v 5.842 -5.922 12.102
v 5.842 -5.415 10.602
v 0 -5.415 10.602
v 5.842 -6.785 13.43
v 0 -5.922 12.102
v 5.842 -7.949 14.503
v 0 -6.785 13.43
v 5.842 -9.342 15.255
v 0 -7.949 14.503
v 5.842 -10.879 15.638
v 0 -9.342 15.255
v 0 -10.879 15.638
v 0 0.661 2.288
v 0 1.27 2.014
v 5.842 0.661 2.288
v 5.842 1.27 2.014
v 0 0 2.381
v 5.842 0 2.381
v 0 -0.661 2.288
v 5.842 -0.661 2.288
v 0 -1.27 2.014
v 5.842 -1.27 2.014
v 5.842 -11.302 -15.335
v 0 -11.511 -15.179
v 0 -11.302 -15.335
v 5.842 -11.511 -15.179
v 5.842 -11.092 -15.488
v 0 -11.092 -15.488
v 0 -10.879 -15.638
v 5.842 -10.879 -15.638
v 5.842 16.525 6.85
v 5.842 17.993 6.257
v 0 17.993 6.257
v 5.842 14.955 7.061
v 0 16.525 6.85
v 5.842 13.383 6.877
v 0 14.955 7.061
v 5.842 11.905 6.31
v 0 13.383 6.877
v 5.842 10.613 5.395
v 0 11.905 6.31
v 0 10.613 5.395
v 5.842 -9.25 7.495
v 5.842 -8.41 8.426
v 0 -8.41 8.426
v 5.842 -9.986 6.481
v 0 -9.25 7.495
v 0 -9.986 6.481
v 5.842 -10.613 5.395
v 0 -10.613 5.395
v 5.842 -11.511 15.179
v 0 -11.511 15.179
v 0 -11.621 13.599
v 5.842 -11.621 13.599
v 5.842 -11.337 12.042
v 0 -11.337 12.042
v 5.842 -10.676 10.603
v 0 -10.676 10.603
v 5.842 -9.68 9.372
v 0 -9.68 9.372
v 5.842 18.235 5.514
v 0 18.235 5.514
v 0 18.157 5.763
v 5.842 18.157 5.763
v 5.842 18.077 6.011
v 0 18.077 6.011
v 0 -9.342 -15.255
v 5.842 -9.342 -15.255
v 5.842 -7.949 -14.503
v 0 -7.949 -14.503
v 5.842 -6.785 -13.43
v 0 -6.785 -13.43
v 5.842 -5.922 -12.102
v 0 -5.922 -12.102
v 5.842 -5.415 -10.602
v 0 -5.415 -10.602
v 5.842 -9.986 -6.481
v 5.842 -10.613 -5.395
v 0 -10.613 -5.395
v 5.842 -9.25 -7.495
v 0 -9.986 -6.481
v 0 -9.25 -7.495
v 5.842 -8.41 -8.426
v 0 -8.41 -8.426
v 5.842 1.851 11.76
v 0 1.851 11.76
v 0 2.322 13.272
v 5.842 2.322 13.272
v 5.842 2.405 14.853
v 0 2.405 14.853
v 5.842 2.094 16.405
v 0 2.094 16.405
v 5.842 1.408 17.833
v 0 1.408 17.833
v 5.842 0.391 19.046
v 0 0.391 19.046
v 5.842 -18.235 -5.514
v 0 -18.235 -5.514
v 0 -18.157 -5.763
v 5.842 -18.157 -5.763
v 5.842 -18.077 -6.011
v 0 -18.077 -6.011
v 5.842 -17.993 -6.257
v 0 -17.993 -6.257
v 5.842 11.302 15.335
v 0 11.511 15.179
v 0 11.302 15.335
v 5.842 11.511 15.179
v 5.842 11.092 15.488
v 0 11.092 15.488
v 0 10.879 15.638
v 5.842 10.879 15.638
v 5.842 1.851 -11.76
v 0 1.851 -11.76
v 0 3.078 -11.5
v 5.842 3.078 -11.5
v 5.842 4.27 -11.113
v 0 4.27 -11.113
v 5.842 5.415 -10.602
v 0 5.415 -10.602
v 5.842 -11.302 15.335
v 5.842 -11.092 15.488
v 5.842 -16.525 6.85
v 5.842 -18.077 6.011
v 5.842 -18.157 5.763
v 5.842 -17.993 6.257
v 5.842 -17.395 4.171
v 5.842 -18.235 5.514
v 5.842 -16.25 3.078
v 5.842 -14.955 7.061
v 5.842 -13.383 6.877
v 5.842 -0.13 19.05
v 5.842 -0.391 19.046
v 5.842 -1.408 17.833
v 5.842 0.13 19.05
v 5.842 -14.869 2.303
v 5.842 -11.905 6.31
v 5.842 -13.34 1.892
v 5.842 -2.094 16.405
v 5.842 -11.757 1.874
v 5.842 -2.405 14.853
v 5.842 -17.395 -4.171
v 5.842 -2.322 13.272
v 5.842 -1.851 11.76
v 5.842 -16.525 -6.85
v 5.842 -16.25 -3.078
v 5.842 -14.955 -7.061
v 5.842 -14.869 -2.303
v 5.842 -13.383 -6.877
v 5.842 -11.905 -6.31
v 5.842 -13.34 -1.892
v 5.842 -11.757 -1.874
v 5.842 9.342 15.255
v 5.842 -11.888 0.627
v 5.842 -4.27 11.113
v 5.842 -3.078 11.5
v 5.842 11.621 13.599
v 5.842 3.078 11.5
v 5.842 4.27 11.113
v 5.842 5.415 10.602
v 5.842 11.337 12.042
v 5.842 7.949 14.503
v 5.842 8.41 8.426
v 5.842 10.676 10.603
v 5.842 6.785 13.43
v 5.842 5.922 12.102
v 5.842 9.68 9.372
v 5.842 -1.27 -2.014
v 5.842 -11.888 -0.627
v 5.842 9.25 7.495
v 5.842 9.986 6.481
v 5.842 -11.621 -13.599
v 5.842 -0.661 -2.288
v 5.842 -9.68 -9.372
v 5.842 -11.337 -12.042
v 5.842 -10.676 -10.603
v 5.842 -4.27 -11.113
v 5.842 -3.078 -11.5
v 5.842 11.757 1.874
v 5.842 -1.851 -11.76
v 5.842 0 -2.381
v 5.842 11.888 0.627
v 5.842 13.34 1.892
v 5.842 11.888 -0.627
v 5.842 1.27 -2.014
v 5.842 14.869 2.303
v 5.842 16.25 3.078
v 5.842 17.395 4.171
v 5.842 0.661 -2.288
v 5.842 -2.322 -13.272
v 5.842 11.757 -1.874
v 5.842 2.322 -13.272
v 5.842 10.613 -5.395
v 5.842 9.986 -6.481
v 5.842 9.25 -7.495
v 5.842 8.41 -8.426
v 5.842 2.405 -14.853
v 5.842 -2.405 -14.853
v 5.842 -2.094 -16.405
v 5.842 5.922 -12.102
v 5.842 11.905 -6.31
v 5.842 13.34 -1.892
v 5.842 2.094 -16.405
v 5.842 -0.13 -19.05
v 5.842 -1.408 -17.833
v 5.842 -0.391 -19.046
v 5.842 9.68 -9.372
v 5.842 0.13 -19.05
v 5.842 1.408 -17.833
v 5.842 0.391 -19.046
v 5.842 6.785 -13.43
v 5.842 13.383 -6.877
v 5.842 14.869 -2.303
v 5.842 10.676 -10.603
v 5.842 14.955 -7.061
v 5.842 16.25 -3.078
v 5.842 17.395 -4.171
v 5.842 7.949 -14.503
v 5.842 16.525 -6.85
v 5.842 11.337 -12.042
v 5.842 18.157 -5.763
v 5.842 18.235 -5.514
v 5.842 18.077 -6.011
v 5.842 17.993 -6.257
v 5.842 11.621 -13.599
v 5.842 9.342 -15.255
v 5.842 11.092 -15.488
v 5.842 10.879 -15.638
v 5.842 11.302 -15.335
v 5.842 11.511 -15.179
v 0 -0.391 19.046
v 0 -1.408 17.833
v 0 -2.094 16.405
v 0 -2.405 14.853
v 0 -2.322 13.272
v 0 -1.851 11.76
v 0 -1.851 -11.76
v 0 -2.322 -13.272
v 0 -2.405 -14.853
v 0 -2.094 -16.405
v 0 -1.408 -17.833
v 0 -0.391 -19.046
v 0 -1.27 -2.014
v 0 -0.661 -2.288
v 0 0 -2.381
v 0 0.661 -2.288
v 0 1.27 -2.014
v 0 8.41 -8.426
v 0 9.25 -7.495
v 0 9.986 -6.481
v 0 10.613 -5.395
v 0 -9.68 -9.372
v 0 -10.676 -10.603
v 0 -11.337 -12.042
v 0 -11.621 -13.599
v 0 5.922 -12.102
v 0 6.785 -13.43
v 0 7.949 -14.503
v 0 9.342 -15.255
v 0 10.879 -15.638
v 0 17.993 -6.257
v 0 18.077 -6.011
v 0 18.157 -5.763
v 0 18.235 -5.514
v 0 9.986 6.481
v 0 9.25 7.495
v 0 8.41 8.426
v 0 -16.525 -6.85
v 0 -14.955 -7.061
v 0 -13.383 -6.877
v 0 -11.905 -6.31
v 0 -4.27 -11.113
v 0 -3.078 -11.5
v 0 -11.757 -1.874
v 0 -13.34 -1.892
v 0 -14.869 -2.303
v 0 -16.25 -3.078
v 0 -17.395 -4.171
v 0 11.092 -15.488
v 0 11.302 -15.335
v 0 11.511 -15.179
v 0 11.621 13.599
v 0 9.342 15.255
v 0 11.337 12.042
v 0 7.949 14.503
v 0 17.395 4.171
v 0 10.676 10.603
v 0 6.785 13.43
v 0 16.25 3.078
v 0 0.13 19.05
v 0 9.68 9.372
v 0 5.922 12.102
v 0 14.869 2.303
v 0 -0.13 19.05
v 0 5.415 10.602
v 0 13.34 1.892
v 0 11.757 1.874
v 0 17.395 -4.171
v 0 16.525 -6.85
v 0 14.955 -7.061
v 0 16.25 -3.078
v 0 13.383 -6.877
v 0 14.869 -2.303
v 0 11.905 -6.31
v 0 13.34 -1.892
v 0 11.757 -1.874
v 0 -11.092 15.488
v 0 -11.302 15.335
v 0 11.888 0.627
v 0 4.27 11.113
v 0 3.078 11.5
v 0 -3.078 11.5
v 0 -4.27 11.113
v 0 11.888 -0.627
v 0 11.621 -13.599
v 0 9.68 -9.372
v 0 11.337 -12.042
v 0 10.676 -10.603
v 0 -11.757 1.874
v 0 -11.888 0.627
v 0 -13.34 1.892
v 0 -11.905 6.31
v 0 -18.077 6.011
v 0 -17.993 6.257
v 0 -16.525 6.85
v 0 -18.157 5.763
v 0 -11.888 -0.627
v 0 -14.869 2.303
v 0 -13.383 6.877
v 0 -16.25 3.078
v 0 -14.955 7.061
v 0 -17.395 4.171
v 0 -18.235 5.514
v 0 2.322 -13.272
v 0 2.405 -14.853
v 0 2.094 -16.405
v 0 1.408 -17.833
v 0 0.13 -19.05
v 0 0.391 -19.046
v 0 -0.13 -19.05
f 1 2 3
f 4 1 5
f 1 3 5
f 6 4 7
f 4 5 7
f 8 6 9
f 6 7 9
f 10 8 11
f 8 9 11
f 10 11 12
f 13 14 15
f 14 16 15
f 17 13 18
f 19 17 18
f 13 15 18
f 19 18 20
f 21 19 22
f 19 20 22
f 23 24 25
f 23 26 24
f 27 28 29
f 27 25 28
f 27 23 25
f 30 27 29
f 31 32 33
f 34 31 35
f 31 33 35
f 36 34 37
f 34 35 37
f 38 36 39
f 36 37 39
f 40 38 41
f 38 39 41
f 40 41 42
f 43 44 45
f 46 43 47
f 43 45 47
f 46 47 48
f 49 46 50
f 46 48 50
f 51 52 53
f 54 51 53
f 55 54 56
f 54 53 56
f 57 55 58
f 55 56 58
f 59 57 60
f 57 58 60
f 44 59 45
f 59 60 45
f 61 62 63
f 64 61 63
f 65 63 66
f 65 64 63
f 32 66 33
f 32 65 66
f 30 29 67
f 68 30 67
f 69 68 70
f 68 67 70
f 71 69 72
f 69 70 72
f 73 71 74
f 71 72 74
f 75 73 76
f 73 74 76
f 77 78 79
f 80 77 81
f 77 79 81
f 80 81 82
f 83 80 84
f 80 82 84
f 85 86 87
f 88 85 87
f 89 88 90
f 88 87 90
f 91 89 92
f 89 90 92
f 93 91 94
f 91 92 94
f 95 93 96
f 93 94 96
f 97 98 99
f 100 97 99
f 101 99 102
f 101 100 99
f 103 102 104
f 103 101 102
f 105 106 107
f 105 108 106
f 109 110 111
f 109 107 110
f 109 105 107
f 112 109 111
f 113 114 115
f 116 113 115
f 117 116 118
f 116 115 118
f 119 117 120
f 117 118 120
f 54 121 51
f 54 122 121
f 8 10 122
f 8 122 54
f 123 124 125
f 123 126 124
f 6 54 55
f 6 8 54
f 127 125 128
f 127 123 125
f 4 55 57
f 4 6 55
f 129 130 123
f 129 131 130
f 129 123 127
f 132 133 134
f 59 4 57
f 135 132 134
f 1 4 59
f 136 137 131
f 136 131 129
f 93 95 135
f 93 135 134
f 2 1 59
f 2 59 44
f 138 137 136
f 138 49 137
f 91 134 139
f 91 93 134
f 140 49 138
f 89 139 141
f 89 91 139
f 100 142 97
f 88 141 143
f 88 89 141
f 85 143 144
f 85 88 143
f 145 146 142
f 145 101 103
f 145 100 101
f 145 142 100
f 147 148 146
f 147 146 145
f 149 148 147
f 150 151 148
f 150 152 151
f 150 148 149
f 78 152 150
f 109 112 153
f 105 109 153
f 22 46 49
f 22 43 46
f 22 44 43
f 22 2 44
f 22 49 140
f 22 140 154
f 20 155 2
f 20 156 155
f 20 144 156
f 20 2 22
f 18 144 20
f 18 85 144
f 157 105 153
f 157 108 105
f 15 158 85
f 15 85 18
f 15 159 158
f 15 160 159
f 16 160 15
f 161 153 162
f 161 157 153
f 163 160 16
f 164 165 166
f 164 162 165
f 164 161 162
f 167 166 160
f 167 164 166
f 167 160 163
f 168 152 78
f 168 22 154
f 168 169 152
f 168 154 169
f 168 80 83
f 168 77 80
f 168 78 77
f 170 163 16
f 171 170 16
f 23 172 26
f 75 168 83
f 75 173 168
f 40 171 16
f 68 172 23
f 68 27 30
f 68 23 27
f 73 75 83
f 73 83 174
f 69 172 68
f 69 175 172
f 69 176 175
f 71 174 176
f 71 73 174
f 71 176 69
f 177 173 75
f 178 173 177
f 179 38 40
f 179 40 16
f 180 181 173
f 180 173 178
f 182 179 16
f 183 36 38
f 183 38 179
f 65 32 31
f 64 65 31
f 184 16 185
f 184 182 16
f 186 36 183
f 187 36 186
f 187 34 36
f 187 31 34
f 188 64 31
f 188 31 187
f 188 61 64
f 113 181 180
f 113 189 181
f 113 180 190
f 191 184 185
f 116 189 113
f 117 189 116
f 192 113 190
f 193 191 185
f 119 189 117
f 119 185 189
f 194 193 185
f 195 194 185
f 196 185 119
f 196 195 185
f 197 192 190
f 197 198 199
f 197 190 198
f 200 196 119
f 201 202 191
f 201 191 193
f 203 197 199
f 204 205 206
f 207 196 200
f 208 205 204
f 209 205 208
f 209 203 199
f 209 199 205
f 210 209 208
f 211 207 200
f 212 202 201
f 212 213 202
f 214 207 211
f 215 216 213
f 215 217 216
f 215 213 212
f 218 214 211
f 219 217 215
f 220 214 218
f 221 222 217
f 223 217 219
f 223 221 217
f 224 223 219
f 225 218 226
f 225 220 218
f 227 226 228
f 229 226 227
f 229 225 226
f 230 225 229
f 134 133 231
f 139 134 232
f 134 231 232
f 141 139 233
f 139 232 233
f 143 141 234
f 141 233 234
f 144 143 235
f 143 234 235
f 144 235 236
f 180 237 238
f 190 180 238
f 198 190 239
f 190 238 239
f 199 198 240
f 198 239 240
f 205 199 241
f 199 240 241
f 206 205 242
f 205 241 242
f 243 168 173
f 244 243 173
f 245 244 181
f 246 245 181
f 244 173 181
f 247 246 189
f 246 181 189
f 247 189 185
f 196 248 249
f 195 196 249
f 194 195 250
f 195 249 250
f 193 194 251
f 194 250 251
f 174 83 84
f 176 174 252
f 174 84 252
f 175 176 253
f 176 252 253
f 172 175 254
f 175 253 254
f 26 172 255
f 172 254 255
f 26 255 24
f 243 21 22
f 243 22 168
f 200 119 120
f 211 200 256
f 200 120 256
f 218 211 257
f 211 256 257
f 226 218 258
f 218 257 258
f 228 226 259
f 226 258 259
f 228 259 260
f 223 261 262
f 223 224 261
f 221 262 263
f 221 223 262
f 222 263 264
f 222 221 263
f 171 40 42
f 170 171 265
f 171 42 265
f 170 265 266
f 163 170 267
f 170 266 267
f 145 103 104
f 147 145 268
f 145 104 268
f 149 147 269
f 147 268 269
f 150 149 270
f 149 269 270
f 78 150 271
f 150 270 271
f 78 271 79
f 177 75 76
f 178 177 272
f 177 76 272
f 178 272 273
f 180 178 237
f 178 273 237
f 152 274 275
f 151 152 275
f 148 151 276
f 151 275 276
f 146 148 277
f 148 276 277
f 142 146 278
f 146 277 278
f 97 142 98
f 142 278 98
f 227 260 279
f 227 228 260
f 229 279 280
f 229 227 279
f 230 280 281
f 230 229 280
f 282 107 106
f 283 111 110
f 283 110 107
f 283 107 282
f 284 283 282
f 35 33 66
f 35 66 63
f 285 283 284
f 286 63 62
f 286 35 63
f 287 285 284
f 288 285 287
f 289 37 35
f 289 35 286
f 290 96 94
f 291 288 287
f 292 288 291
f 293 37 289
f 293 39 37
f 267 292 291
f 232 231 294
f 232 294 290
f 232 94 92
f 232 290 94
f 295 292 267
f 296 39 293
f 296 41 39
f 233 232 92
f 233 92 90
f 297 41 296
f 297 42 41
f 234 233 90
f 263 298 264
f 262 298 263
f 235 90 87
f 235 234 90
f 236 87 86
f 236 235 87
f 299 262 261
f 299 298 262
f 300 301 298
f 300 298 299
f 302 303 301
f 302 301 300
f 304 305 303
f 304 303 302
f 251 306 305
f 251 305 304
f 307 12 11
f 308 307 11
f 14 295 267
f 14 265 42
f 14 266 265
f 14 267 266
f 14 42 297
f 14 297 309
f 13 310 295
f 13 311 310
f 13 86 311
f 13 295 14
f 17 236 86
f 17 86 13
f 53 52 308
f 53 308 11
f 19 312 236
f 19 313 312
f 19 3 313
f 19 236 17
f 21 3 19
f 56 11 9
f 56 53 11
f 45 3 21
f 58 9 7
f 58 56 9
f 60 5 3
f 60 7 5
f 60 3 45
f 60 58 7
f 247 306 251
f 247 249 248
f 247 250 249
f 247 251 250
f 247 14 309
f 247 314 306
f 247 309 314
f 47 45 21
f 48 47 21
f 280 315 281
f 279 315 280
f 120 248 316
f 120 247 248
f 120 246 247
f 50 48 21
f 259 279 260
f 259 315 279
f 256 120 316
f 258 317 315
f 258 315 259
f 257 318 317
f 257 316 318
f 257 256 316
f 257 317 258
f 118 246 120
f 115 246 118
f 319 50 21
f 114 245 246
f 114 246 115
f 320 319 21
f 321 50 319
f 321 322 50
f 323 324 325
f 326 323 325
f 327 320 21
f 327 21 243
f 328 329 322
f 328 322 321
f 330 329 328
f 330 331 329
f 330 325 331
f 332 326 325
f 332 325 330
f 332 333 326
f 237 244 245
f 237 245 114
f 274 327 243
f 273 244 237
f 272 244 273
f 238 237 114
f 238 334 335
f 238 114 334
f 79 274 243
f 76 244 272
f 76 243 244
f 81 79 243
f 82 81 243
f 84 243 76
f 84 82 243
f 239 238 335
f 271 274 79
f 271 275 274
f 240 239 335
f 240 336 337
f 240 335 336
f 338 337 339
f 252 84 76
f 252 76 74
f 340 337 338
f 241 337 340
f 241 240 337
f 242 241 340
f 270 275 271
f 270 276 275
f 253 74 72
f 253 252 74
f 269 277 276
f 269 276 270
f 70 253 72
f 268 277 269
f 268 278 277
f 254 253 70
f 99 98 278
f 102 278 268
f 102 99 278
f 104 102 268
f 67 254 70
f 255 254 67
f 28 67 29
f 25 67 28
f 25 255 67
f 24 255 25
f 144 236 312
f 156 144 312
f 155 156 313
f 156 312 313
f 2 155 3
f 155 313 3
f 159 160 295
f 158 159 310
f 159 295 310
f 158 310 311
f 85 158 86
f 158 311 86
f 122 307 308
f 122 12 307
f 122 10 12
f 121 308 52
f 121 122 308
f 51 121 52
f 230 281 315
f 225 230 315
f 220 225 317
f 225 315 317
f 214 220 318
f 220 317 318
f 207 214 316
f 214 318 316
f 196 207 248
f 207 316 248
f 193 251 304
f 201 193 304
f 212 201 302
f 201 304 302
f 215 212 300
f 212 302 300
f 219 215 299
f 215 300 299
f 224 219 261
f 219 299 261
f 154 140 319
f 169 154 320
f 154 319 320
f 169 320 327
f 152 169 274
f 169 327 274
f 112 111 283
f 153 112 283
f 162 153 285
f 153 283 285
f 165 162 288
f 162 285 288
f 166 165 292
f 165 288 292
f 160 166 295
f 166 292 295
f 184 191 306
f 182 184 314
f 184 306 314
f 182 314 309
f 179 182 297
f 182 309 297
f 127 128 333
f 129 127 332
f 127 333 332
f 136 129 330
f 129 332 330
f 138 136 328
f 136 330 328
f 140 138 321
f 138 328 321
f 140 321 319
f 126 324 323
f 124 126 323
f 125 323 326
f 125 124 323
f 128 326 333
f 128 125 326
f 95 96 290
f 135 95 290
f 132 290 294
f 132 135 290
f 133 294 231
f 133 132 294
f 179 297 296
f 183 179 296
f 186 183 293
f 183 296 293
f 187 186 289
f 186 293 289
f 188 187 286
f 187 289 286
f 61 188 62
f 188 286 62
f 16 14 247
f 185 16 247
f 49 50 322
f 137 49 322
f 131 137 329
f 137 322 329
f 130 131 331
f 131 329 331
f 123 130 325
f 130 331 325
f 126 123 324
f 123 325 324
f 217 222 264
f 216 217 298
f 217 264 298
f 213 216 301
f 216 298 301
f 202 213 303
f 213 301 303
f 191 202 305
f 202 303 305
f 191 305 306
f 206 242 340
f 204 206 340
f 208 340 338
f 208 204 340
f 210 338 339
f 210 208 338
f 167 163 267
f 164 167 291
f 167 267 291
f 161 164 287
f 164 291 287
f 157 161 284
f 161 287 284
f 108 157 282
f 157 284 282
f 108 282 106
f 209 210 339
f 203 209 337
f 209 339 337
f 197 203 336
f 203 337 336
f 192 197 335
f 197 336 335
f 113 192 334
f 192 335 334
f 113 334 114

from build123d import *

# Parameters (mm, degrees)
BASPROSKE_W         = 5.842
BASPROSKE_H         = 19.05
TOOTHCUT_DEPTH      = 28.566899789
TEETHCUTS_COUNT     = 10
TEETHCUTS_ANGLE     = 324
BORSKE_R            = 2.38125
BORE_DEPTH          = 50.8000508
BOSS_EXTRUDE1_DEPTH = 5.842
BOSS_EXTRUDE2_DEPTH = 5.842


with BuildPart() as part:
    # BasProSke → Base-Revolve (revolve)
    with BuildSketch(Plane(origin=(0, 0, 0), x_dir=(1, 0, 0), z_dir=(0, 1, 0)), mode=Mode.PRIVATE) as base_revolve_sk:
        with Locations((2.921, 9.525)):
            Rectangle(BASPROSKE_W, BASPROSKE_H)
    revolve(base_revolve_sk.sketch.rotate(Axis((-10, 0, 0), (1, 0, 0)), 180), axis=Axis((-10, 0, 0), (1, 0, 0)))

    # TooCutSke → ToothCut (cut, through all)
    with BuildSketch(Plane(origin=(0, 0, 0), x_dir=(0, 0, -1), z_dir=(1, 0, 0))):
        with BuildLine():
            ThreePointArc((1.873548596, 11.756630659), (0, 11.90498), (-1.873548596, 11.756630659))
            ThreePointArc((-1.873548596, 11.756630659), (-2.656568084, 15.60034376), (-5.548507123, 18.250615164))
            ThreePointArc((-5.548507123, 18.250615164), (0, 19.0754), (5.548507123, 18.250615164))
            ThreePointArc((5.548507123, 18.250615164), (2.656568084, 15.60034376), (1.873548596, 11.756630659))
        make_face()
    toothcut = extrude(amount=TOOTHCUT_DEPTH, mode=Mode.SUBTRACT)

    # TeethCuts: ToothCut ×10 about axis
    teethcuts_axis = Axis((-10, 0, 0), (1, 0, 0))
    for i in range(1, TEETHCUTS_COUNT):
        add(toothcut.rotate(teethcuts_axis, i * TEETHCUTS_ANGLE / (TEETHCUTS_COUNT - 1)), mode=Mode.SUBTRACT)

    # BorSke → Bore (cut, symmetric)
    with BuildSketch(Plane(origin=(0, 0, 0), x_dir=(0, 0, -1), z_dir=(1, 0, 0))):
        with Locations(Location((0, 0, 0), (0, 0, 180))):
            Circle(BORSKE_R)
    extrude(amount=BORE_DEPTH, both=True, mode=Mode.SUBTRACT)

    # Sketch1 → Boss-Extrude1 (add)
    with BuildSketch(Plane(origin=(5.842, 0, 0), x_dir=(0, 0, -1), z_dir=(1, 0, 0))):
        with BuildLine():
            Line((-4.4067353, 4.572), (4.4067353, 4.572))
            ThreePointArc((4.4067353, 4.572), (0, 6.35), (-4.4067353, 4.572))
        make_face()
    extrude(amount=-BOSS_EXTRUDE1_DEPTH)

    # Sketch2 → Boss-Extrude2 (add)
    with BuildSketch(Plane(origin=(5.842, 0, 0), x_dir=(0, 0, -1), z_dir=(1, 0, 0))):
        with BuildLine():
            Line((-2.177028232, 1.27), (2.177028232, 1.27))
            ThreePointArc((2.177028232, 1.27), (0, 2.520387256), (-2.177028232, 1.27))
        make_face()
        with BuildLine():
            Line((-2.177028232, -1.27), (2.177028232, -1.27))
            ThreePointArc((2.177028232, -1.27), (0, -2.520387256), (-2.177028232, -1.27))
        make_face()
    extrude(amount=-BOSS_EXTRUDE2_DEPTH)


solid = part.part
